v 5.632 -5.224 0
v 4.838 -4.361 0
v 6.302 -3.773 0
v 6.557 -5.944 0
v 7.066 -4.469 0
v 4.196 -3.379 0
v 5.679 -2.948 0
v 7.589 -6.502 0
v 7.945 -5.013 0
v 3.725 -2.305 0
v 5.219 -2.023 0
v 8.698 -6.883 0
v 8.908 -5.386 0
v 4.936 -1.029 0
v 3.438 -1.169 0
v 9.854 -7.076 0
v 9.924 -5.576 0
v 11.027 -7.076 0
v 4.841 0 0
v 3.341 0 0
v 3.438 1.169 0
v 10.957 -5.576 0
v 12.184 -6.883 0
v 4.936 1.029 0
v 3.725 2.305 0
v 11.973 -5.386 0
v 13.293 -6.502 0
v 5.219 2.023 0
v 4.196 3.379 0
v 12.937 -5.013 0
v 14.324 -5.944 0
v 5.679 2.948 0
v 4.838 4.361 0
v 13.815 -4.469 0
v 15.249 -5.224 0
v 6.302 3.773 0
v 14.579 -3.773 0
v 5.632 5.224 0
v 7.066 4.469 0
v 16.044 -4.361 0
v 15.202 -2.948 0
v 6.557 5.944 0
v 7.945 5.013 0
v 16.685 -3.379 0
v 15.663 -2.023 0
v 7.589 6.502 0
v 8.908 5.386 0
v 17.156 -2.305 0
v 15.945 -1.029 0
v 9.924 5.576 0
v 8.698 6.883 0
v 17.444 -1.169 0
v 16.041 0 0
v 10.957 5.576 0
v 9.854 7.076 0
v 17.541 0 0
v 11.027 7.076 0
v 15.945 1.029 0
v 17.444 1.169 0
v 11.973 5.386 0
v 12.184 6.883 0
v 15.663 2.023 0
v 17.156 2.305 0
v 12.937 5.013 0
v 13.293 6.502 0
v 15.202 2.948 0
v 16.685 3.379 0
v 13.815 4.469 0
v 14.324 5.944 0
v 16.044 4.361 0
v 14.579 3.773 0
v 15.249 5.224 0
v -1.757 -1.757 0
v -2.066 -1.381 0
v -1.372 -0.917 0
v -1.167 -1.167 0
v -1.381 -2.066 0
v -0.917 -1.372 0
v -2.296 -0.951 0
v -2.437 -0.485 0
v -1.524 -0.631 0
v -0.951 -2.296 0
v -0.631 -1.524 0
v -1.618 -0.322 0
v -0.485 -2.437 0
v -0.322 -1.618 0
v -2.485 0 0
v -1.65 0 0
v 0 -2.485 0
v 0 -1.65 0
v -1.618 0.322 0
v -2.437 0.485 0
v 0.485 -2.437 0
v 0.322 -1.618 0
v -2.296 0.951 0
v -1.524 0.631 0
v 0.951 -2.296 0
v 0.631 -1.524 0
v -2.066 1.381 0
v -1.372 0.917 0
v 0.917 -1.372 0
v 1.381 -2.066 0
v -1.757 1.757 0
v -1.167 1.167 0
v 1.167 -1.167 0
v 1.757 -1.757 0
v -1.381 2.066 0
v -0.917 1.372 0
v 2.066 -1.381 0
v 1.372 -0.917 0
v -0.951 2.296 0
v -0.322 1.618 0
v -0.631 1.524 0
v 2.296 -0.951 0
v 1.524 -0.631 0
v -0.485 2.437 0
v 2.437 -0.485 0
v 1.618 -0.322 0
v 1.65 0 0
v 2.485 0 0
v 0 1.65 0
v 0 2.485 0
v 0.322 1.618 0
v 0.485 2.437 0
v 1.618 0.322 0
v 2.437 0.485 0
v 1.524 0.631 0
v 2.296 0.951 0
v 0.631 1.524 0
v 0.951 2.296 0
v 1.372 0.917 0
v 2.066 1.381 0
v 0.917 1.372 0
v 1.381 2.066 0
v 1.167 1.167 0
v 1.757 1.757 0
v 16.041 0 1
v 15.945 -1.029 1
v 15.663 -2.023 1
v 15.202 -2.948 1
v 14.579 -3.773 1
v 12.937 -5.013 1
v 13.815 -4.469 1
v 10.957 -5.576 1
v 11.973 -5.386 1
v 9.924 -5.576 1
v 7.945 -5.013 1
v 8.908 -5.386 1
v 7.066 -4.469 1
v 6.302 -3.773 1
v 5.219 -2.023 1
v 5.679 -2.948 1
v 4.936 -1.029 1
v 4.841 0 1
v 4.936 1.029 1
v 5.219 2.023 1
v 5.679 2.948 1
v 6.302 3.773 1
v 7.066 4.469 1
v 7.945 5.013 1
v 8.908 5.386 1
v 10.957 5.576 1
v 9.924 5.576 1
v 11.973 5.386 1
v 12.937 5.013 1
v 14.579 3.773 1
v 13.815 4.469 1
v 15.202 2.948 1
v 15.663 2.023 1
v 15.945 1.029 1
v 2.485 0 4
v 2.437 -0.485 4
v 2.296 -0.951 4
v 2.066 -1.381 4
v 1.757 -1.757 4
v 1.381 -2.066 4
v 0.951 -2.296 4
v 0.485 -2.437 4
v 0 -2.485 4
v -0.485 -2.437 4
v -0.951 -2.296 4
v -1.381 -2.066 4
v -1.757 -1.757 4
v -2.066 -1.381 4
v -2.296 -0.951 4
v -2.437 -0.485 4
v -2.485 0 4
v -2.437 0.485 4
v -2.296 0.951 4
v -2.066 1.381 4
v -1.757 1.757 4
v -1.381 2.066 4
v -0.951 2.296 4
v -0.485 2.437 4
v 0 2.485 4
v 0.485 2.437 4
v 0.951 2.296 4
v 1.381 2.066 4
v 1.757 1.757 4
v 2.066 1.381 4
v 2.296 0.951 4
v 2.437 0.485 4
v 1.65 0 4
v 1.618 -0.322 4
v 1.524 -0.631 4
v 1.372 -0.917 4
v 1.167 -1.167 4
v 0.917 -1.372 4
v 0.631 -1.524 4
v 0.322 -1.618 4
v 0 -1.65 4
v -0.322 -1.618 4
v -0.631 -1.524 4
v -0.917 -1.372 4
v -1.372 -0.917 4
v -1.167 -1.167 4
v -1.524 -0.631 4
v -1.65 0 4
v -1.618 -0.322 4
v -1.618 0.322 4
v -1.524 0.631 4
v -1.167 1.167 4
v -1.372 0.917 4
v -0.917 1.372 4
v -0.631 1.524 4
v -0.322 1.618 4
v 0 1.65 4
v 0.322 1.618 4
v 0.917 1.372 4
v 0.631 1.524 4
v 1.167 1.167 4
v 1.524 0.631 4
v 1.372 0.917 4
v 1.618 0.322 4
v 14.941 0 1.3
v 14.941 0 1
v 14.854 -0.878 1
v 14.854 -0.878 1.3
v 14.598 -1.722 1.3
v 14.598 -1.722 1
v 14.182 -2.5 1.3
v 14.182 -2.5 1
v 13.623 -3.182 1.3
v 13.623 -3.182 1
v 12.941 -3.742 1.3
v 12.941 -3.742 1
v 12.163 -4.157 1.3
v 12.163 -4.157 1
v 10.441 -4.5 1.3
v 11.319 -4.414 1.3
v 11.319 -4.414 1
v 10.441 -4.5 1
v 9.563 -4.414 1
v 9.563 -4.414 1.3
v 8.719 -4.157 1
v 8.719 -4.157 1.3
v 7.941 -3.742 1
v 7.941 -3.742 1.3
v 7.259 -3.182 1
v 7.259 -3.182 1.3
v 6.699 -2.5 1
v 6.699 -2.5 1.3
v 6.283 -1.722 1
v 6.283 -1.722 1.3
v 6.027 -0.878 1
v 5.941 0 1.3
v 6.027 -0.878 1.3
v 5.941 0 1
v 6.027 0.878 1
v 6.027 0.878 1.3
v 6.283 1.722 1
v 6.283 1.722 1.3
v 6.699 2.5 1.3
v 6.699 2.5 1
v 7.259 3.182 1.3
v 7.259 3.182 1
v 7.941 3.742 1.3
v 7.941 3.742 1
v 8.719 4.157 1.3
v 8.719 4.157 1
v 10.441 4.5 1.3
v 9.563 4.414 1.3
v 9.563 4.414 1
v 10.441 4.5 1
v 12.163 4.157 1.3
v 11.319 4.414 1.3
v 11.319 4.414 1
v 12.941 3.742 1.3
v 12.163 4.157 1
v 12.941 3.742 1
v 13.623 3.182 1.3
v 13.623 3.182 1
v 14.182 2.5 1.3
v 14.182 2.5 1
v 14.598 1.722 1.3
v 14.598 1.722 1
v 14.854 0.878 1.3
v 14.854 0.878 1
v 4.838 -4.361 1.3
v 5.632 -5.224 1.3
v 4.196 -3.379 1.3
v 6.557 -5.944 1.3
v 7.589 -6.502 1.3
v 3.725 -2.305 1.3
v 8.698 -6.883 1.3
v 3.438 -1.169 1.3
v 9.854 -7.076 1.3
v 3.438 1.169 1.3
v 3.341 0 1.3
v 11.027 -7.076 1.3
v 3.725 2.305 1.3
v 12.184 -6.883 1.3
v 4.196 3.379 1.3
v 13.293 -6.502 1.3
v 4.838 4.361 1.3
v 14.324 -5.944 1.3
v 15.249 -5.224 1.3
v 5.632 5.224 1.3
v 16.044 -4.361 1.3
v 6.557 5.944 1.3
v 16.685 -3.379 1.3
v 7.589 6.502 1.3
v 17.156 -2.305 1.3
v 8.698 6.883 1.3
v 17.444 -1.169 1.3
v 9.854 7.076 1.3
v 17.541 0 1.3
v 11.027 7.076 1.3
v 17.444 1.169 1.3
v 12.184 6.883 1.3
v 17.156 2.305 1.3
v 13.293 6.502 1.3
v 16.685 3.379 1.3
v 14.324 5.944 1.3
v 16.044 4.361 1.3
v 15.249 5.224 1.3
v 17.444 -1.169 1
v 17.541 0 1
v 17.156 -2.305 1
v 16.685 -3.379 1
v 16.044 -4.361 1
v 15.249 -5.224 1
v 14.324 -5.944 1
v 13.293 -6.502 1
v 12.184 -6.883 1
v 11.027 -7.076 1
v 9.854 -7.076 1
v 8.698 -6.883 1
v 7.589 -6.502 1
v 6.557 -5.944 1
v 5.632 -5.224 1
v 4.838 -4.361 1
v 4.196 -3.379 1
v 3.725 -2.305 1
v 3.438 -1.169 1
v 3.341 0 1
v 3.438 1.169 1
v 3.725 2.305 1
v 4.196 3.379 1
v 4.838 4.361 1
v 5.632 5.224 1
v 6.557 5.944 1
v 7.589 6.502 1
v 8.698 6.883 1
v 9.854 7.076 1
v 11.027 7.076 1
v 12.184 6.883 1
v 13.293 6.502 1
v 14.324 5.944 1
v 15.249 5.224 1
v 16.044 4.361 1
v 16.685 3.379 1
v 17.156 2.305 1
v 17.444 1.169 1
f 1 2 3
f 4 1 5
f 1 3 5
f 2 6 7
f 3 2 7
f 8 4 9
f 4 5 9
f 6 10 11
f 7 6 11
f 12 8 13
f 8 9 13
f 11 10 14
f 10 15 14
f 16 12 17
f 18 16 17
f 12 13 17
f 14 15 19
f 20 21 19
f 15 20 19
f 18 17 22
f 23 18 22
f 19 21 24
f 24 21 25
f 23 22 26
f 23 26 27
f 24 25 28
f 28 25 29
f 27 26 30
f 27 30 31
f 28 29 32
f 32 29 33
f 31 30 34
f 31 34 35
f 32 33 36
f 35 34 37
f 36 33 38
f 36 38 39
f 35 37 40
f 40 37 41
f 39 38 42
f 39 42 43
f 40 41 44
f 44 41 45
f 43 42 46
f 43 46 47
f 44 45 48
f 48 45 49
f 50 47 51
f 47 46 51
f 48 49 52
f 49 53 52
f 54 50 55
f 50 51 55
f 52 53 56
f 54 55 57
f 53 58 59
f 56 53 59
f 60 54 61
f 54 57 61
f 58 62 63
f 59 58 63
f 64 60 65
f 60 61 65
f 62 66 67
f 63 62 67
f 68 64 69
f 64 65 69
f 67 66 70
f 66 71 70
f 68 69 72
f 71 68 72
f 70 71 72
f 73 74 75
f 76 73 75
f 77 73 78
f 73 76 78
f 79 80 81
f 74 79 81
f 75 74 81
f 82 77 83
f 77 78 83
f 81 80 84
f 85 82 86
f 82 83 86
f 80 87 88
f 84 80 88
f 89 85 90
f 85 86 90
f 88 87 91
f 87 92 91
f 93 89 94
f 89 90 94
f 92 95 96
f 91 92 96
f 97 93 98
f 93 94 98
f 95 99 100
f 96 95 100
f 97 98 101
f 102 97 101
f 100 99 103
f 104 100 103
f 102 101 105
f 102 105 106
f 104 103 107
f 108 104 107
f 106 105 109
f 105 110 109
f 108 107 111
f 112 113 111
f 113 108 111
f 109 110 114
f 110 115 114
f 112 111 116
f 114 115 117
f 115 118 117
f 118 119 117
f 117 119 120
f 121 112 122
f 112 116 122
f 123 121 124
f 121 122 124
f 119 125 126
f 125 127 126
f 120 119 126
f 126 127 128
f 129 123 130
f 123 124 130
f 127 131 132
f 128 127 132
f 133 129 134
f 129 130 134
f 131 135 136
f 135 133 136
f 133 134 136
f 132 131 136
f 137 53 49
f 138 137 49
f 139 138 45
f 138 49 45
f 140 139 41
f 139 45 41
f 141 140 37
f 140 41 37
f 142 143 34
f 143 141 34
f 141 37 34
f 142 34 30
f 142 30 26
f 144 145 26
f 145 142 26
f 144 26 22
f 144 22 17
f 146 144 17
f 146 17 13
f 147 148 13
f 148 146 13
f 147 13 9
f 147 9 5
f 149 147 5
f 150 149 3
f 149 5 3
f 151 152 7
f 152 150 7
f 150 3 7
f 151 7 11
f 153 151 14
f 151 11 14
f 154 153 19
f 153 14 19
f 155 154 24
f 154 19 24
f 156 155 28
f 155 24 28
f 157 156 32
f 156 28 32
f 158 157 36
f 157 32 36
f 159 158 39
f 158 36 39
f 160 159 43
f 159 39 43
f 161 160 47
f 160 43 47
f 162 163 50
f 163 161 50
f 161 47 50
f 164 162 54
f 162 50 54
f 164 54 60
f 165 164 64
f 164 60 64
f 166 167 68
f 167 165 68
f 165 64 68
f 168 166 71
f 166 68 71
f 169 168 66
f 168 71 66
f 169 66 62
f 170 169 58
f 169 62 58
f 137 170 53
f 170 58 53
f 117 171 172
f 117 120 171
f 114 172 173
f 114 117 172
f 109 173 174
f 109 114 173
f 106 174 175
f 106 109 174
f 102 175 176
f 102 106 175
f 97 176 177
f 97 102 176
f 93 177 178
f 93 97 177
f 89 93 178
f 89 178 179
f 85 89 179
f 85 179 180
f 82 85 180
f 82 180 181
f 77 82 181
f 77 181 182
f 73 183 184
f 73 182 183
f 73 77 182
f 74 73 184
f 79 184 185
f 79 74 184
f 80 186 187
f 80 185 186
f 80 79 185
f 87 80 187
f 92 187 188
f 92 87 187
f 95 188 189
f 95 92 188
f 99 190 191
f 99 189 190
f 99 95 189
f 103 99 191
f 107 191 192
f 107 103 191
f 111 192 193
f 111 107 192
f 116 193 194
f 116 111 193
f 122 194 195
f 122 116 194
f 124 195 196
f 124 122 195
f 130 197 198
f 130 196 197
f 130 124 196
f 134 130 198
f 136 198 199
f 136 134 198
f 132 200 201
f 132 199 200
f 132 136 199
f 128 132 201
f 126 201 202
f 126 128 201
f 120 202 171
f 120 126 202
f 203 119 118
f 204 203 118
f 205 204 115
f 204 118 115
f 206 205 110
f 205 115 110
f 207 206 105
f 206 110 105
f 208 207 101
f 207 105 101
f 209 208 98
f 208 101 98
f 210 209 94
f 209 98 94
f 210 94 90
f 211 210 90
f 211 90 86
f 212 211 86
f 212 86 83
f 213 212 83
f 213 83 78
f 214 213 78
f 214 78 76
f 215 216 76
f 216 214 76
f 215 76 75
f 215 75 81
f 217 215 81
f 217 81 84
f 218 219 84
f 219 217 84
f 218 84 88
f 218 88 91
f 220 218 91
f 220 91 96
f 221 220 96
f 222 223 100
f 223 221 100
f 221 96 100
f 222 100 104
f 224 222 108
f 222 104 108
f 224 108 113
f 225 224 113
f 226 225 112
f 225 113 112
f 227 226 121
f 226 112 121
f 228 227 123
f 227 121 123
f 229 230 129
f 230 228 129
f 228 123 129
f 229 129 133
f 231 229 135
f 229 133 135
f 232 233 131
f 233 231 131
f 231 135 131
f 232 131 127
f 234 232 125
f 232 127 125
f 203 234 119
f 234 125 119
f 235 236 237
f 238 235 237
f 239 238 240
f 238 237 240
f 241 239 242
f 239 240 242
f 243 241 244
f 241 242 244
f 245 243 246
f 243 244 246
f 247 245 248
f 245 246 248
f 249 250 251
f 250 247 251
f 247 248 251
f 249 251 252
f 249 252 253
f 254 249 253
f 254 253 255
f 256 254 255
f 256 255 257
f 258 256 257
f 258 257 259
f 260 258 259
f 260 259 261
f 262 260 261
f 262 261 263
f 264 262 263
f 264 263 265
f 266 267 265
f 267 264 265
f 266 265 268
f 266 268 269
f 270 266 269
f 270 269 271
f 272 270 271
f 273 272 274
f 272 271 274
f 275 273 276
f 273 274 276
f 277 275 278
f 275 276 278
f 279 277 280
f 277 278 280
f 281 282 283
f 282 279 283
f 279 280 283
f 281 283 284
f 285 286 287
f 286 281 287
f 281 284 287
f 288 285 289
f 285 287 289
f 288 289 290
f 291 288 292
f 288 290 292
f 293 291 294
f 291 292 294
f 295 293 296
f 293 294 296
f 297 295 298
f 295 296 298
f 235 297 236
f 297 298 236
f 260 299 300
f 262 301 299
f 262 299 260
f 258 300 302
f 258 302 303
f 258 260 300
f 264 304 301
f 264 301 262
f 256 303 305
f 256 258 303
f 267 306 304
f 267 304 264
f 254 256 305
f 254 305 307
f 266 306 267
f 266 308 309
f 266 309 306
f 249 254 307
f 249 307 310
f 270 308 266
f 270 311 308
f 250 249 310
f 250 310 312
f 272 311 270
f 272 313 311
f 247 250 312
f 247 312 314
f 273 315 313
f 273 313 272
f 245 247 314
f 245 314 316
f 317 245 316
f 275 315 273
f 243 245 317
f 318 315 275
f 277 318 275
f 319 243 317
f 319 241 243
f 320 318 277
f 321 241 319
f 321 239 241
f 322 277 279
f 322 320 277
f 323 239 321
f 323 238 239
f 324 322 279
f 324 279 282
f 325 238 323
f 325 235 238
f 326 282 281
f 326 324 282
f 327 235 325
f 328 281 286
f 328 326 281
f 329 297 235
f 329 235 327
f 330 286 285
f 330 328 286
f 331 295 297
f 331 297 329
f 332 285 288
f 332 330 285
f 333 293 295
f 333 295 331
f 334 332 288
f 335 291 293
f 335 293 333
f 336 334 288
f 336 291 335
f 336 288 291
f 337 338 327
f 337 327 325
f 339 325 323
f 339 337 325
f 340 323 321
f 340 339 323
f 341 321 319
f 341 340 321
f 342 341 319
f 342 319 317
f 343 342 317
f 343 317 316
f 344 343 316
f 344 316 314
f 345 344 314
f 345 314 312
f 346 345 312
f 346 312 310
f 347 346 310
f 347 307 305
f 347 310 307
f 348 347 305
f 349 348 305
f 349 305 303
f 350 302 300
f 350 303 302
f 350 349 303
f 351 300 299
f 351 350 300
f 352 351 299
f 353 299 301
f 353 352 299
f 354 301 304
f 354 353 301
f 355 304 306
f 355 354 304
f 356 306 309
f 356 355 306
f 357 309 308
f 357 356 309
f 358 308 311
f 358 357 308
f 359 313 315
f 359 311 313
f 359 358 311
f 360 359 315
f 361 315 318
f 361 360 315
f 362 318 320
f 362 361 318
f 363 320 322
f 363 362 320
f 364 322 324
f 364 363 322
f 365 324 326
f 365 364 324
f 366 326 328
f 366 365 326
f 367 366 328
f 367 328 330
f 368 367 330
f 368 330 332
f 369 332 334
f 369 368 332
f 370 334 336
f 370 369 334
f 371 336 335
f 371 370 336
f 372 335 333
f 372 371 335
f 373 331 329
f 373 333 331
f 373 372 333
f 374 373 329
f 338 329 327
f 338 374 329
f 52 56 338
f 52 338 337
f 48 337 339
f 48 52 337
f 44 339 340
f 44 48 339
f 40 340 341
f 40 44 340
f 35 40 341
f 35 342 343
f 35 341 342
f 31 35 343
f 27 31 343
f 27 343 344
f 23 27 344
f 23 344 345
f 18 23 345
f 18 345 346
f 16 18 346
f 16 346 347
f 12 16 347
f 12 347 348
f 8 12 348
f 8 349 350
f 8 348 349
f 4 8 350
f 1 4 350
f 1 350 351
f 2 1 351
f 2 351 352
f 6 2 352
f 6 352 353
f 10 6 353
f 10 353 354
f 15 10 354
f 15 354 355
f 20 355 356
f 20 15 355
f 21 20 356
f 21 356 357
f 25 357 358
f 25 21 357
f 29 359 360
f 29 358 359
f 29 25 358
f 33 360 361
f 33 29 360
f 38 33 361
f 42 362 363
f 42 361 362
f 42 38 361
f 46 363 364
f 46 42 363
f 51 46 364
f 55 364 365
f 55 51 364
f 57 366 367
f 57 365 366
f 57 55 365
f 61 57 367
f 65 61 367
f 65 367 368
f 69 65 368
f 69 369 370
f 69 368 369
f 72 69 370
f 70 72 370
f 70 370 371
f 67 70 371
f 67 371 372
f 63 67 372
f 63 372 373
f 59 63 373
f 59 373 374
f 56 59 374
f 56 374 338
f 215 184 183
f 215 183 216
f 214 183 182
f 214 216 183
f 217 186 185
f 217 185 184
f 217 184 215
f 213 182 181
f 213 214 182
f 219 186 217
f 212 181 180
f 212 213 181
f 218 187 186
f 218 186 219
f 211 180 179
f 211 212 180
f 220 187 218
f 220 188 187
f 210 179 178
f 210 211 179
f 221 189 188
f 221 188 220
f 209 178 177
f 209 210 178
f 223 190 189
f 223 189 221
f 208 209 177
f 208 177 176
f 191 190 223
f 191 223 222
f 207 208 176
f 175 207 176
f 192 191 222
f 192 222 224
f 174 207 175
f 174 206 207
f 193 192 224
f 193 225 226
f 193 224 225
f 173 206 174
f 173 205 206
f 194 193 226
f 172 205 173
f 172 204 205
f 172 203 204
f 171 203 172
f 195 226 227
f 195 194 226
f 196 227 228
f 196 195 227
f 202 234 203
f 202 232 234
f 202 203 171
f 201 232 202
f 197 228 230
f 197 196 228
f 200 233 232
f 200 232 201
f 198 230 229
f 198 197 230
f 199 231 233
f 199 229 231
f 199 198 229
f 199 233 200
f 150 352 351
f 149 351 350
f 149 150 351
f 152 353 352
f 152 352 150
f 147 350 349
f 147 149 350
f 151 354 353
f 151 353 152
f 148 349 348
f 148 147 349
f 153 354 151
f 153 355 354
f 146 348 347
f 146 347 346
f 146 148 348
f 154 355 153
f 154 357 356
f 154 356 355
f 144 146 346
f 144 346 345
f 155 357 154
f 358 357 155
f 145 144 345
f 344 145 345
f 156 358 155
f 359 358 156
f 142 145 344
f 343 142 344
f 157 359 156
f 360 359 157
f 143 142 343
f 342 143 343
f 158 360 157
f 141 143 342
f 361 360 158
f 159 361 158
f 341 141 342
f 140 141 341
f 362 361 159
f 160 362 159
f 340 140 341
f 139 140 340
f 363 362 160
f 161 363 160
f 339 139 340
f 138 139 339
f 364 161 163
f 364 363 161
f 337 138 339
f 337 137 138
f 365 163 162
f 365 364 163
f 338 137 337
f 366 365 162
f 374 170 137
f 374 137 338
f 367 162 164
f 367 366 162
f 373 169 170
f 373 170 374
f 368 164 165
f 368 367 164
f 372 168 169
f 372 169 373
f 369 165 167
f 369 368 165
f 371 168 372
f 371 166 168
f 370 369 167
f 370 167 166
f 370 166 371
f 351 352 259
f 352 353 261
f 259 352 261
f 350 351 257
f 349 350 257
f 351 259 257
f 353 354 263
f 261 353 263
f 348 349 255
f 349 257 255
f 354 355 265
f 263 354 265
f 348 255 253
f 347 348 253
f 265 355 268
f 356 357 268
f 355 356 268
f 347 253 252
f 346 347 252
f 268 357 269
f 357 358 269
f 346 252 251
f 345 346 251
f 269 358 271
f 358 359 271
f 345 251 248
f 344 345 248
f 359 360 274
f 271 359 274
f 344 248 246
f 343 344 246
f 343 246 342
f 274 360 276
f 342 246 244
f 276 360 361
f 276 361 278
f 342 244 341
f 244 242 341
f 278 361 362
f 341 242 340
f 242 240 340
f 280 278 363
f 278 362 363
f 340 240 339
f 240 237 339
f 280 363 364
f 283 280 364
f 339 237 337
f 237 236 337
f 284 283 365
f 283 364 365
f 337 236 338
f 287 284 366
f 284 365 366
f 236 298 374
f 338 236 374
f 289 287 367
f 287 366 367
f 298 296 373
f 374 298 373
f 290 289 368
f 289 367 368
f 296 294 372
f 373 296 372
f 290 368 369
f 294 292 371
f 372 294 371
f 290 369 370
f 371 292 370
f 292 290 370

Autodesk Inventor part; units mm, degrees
ref_plane "YZ Plane" through (0, 0, 0) normal (1, 0, 0) x (0, 1, 0)
ref_plane "XZ Plane" through (0, 0, 0) normal (0, 1, 0) x (-1, 0, 0)
ref_plane "XY Plane" through (0, 0, 0) normal (0, 0, 1) x (1, 0, 0)
sketch "Sketch1" plane through (0, 0, 0) normal (0, 0, 1) x (1, 0, 0)
  circle A0 centre (0, 0) radius 2.485
  circle A1 centre (0, 0) radius 1.65
  circle A2 centre (10.4407, 0) radius 5.6
  circle A3 centre (10.4407, 0) radius 7.1
  dimension "d0" = 4.97
  dimension "d3" = 3.3
  dimension "d4" = 11.2
  dimension "d5" = 1.5
extrude "Extrusion1" add sketch "Sketch1" along normal blind 4 contours A0
extrude "Extrusion2" add sketch "Sketch1" along normal blind 1 separate body contours A3
sketch "Sketch2" plane through (10.4407, 0, 1) normal (0, 0, 1) x (1, 0, 0)
  circle A0 centre (0, 0) radius 7.1 projected
  circle A1 centre (0, 0) radius 5.6 projected
  circle A2 centre (0, 0) radius 4.5
  point P0 (-10.4407, 0)
  dimension "d8" = 9
extrude "Extrusion4" add sketch "Sketch2" along normal blind 0.3 separate body contours A0 | A1
properties part number "Ball_Gearing_Workaroung"
